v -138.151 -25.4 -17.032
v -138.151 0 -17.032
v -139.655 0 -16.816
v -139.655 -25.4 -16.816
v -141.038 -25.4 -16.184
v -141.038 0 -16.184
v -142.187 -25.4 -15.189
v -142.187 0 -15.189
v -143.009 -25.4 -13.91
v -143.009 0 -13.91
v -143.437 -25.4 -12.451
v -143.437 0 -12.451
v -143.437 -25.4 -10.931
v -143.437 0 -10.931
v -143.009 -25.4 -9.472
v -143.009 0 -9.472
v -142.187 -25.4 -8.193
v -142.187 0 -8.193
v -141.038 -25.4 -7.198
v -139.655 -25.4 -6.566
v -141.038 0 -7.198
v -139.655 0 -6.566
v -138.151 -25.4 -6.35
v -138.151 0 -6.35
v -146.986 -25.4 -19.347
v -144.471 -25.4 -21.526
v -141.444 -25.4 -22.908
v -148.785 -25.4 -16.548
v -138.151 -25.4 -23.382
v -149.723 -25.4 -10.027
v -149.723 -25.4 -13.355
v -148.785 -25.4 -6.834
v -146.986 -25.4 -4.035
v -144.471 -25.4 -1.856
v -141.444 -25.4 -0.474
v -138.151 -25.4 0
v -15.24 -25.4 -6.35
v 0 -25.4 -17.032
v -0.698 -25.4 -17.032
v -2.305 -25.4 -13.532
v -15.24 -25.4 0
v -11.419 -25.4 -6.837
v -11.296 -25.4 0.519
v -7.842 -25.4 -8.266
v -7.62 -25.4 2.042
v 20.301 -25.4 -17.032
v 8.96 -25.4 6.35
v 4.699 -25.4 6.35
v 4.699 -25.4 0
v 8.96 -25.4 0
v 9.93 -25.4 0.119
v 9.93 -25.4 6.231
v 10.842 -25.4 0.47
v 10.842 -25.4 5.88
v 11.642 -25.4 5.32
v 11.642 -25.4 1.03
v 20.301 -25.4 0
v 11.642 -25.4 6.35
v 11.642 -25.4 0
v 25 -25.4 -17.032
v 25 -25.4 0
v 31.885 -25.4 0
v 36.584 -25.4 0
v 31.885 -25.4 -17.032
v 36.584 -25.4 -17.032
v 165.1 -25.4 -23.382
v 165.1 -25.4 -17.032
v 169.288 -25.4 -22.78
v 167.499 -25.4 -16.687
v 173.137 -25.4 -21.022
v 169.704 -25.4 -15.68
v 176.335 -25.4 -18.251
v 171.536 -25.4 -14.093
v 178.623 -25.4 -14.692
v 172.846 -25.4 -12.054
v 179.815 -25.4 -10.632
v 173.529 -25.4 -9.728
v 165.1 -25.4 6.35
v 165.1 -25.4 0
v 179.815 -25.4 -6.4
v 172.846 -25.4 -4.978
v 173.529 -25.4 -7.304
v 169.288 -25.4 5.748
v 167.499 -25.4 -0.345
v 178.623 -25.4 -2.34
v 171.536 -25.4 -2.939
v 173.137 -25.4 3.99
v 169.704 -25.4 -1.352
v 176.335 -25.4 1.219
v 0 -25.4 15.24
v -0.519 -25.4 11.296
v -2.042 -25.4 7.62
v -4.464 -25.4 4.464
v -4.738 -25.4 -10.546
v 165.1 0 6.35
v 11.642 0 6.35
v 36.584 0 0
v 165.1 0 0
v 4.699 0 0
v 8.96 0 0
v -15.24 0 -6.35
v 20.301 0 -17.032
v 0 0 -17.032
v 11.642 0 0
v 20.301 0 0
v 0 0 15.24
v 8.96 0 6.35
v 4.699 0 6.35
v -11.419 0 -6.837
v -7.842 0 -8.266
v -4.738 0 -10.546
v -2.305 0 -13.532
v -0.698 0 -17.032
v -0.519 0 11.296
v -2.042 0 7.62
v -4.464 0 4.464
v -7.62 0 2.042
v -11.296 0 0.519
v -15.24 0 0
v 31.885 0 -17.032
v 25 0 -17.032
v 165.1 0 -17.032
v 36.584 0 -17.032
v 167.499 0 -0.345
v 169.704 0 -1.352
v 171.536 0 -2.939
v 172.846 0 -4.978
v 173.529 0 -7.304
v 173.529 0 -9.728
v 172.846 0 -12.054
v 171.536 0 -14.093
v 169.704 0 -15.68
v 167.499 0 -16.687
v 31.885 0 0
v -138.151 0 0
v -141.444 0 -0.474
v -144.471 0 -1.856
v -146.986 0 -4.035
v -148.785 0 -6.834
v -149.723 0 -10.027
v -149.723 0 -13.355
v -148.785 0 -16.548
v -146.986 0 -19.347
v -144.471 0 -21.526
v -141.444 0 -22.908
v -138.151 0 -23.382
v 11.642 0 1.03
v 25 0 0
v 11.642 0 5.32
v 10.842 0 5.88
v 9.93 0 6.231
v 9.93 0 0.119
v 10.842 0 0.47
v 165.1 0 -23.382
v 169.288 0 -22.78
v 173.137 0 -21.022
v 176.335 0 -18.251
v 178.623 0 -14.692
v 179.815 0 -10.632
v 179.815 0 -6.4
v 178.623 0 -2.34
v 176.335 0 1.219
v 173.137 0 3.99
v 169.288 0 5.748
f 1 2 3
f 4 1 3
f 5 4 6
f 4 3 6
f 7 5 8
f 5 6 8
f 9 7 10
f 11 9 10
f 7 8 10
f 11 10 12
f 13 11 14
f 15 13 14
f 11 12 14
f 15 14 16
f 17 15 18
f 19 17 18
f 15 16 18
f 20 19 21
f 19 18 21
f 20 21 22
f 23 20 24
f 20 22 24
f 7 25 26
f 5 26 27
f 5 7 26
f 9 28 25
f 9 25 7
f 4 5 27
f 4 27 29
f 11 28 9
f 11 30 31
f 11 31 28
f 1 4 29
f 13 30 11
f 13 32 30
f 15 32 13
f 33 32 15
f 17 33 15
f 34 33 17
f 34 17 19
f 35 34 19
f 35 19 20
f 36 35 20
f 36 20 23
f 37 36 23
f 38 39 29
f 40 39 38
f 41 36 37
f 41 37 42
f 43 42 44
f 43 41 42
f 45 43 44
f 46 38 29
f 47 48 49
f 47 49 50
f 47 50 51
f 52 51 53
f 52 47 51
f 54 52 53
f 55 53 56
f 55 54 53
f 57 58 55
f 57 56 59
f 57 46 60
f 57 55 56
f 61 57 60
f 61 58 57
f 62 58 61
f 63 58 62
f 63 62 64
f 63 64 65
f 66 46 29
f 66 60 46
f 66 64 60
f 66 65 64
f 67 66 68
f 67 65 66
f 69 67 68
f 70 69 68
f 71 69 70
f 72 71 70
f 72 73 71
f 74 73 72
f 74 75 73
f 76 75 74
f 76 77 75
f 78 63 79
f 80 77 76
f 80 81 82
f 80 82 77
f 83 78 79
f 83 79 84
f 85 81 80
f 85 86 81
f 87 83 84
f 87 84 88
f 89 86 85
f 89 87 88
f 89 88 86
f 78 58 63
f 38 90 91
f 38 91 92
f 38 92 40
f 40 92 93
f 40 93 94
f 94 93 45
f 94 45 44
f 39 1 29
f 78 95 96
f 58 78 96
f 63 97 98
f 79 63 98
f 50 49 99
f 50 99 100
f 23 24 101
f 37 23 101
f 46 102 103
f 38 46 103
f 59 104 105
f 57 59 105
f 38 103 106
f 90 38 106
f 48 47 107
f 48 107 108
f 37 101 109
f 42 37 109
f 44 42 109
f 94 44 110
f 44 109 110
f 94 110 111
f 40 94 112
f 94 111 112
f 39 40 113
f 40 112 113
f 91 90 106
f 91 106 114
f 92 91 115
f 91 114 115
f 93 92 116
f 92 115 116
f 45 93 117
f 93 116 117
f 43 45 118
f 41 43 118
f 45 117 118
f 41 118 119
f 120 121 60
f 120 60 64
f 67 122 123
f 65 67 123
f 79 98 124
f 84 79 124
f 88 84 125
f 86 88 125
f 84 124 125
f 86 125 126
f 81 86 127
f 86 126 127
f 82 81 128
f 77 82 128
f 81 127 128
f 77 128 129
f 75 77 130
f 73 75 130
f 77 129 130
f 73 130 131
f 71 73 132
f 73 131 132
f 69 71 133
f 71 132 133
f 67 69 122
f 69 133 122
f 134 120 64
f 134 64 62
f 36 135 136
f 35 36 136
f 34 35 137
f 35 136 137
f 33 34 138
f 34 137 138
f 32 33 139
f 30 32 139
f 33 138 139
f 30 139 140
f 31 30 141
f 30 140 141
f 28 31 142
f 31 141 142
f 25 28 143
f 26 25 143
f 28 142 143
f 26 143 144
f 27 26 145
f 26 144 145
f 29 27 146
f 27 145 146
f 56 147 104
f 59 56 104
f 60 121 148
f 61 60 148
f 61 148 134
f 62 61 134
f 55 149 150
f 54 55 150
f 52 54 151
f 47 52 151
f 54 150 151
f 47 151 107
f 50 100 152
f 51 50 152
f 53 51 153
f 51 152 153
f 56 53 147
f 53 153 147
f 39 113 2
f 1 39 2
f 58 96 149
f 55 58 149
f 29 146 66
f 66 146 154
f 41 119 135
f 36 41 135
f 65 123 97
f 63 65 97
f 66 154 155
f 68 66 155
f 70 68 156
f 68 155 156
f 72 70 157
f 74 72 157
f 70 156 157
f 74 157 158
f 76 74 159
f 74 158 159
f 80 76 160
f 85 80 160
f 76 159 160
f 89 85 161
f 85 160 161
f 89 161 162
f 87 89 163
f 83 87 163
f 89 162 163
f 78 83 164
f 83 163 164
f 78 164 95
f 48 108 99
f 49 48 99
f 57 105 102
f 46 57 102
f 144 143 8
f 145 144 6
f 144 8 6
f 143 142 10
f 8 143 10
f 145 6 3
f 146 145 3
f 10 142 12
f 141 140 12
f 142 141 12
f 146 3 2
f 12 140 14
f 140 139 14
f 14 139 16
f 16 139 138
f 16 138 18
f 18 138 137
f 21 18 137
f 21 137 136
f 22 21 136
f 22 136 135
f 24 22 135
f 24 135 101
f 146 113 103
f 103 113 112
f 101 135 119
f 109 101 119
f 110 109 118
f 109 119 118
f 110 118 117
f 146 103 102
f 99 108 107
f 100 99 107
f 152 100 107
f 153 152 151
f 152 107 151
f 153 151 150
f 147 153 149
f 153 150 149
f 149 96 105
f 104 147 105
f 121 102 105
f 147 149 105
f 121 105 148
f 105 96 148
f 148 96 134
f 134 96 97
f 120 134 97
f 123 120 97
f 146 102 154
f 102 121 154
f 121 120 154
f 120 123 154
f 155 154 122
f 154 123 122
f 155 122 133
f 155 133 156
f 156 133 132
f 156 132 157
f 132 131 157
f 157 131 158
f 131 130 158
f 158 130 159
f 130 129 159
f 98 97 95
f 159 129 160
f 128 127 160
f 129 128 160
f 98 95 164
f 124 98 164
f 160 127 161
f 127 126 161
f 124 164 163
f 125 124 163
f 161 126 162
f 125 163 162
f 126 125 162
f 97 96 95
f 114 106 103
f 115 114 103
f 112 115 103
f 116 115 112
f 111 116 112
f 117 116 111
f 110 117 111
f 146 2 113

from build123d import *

# Parameters (mm, degrees)
F0_W     = 6.884935
F0_H     = 17.032009
F1_DEPTH = 25.4


with BuildPart() as f1:
    # F0 (on Front) → F1 (new body)
    with BuildSketch(Plane.XZ):
        with BuildLine():
            Line((0, -6.35), (0, 0))
            Line((0, 0), (0, 6.35))
            Line((0, 6.35), (0, 15.24))
            ThreePointArc((0, 15.24), (-4.463693, 4.463693), (-15.24, 0))
            Line((-15.24, 0), (-138.150647, 0))
            ThreePointArc((-138.150647, 0), (-149.841652, -11.691004), (-138.150647, -23.382009))
            Line((-138.150647, -23.382009), (-100.798674, -23.382009))
            Line((-100.798674, -23.382009), (0, -23.382009))
            Line((0, -23.382009), (165.1, -23.382009))
            ThreePointArc((165.1, -23.382009), (179.966004, -8.516004), (165.1, 6.35))
            Line((165.1, 6.35), (12.470275, 6.35))
            Line((12.470275, 6.35), (11.642048, 6.35))
            Line((11.642048, 6.35), (11.642048, 5.319719))
            Line((11.642048, 5.319719), (11.642048, 1.030281))
            Line((11.642048, 1.030281), (11.642048, 0))
            Line((11.642048, 0), (12.470275, 0))
            Line((12.470275, 0), (20.300698, 0))
            Line((20.300698, 0), (20.300698, -17.032009))
            Line((20.300698, -17.032009), (0, -17.032009))
            Line((0, -17.032009), (0, -6.35))
        make_face()
        with BuildLine():
            ThreePointArc((-15.24, -6.35), (-6.217977, -9.307464), (-0.697568, -17.032009))
            Line((-0.697568, -17.032009), (-100.798674, -17.032009))
            Line((-100.798674, -17.032009), (-138.150647, -17.032009))
            ThreePointArc((-138.150647, -17.032009), (-143.491652, -11.691004), (-138.150647, -6.35))
            Line((-138.150647, -6.35), (-15.24, -6.35))
        make_face(mode=Mode.SUBTRACT)
        with Locations((28.442165, -8.516004)):
            Rectangle(F0_W, F0_H, mode=Mode.SUBTRACT)
        with BuildLine():
            ThreePointArc((165.1, 0), (173.616004, -8.516004), (165.1, -17.032009))
            Line((165.1, -17.032009), (36.583633, -17.032009))
            Line((36.583633, -17.032009), (36.583633, 0))
            Line((36.583633, 0), (165.1, 0))
        make_face(mode=Mode.SUBTRACT)
        with BuildLine():
            ThreePointArc((8.959904, 0), (10.396513, 0.266429), (11.642048, 1.030281))
            Line((11.642048, 1.030281), (11.642048, 5.319719))
            ThreePointArc((11.642048, 5.319719), (10.396513, 6.083571), (8.959904, 6.35))
            Line((8.959904, 6.35), (4.699, 6.35))
            Line((4.699, 6.35), (4.699, 0))
            Line((4.699, 0), (8.959904, 0))
        make_face()
    extrude(amount=F1_DEPTH)


solid = f1.part
